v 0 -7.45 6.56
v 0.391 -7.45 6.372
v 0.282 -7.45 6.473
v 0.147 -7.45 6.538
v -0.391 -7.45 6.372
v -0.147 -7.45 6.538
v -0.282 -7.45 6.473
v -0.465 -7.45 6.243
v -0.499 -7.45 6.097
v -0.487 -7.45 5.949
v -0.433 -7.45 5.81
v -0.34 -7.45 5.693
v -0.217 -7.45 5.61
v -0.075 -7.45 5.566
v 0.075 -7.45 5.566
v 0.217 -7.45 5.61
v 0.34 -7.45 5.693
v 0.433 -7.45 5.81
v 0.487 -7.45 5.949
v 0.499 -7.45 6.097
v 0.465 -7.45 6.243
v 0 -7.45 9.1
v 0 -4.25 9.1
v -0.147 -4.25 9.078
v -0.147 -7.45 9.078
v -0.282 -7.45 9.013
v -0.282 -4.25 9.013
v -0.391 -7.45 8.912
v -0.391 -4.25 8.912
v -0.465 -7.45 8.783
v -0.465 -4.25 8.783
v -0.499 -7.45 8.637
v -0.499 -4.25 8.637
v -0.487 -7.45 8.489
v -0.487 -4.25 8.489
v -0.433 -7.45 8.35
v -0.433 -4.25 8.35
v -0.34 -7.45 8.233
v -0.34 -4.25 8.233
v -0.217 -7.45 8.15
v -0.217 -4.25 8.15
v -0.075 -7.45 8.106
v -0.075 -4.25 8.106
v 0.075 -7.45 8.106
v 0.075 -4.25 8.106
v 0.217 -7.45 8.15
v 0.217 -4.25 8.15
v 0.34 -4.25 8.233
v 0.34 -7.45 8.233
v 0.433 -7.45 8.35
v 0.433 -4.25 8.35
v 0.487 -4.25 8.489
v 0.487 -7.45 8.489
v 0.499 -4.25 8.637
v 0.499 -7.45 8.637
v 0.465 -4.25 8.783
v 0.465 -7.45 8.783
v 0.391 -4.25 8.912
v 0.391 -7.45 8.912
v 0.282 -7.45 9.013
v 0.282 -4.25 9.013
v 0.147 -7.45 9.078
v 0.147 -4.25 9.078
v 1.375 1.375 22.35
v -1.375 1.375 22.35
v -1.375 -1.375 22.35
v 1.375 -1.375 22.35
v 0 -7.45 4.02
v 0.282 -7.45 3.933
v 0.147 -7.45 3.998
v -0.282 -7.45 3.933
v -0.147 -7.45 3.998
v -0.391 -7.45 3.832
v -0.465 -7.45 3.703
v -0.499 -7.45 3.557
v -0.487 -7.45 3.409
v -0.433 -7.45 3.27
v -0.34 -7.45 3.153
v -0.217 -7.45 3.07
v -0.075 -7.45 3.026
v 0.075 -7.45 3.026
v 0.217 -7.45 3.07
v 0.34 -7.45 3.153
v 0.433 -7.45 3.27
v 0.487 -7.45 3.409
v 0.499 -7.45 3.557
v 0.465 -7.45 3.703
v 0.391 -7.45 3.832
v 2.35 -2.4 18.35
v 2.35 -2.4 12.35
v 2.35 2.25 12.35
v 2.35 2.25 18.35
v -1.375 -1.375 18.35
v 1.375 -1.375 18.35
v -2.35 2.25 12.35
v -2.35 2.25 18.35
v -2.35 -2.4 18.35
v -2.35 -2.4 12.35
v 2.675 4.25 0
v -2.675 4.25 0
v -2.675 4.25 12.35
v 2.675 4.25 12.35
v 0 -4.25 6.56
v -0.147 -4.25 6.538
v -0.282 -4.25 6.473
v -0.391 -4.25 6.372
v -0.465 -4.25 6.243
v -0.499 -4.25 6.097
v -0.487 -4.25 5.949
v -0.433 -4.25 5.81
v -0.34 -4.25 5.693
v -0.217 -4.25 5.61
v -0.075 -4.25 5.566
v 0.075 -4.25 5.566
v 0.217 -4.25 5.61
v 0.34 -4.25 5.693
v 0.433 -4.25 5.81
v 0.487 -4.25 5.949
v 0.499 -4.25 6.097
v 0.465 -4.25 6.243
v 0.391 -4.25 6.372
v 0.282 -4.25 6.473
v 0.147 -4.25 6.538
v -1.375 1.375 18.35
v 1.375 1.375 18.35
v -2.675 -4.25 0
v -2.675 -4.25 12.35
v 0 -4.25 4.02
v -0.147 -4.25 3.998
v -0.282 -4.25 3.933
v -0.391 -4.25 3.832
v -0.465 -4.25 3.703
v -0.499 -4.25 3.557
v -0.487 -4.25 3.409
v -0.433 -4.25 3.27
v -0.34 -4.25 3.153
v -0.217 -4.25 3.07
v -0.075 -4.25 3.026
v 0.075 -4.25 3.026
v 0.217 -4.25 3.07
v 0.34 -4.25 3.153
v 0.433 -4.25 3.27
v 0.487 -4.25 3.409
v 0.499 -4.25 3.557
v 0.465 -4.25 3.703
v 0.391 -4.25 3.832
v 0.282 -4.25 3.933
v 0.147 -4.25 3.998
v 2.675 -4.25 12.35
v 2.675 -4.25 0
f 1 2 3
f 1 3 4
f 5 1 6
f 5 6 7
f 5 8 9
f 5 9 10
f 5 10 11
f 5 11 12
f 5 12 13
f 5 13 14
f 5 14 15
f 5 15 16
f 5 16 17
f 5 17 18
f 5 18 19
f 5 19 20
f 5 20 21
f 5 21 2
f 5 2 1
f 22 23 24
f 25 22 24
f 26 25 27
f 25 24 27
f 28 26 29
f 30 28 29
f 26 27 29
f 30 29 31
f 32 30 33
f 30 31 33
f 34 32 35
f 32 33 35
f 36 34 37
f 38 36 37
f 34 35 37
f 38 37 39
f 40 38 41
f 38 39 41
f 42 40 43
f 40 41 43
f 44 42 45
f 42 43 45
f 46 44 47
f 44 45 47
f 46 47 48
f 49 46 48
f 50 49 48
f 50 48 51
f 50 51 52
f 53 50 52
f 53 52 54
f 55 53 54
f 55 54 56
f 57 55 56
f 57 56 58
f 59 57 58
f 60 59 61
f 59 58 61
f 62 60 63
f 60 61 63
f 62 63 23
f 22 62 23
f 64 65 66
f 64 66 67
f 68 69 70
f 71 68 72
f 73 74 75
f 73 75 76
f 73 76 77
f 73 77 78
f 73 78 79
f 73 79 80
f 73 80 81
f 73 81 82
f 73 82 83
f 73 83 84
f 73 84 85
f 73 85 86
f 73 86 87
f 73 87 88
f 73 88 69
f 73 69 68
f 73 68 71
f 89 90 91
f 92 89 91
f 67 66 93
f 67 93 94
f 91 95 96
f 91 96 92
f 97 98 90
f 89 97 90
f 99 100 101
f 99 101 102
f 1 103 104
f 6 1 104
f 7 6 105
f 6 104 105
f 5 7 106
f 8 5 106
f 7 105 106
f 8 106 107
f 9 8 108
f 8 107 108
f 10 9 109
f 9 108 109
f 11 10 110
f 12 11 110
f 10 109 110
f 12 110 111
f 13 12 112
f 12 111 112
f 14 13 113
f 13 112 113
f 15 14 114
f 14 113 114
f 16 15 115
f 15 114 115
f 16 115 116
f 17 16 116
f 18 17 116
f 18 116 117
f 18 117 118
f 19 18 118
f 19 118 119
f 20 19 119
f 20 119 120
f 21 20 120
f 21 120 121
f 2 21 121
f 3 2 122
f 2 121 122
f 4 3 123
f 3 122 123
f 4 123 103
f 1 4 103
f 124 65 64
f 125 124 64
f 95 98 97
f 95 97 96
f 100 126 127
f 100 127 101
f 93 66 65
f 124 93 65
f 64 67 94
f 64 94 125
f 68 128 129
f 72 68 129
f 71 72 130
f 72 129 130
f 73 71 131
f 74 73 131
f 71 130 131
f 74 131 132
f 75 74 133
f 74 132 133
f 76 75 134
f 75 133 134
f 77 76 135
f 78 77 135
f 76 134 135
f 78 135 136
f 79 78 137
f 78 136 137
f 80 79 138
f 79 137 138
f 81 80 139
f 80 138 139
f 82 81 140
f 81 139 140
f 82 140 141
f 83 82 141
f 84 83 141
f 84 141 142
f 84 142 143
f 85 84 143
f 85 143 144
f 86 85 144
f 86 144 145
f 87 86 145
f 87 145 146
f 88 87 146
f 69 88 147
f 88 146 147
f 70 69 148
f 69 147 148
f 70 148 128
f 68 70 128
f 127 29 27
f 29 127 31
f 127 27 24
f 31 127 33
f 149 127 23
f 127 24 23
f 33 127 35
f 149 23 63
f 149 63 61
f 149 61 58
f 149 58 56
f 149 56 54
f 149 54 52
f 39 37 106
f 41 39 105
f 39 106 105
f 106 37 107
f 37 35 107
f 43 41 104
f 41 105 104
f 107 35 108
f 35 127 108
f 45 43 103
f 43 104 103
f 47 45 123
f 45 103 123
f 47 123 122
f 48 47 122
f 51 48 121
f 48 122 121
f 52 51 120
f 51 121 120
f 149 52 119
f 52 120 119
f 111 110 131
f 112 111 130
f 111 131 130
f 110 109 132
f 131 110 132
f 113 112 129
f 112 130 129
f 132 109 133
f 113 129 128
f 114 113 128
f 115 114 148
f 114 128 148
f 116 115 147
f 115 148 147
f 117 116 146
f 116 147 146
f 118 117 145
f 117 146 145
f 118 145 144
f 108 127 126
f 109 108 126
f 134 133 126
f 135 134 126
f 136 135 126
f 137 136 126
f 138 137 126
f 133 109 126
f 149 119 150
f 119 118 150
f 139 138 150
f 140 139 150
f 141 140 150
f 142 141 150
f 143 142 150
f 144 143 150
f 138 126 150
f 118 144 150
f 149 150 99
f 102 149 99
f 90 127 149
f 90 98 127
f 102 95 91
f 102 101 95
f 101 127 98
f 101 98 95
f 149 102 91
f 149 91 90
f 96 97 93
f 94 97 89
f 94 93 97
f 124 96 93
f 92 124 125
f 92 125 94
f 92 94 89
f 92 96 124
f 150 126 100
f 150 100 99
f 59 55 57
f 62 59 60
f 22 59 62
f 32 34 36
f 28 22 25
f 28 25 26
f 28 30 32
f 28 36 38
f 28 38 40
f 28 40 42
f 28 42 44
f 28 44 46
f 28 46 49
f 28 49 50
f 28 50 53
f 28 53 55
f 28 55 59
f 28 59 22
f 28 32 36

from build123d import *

# Parameters (mm, degrees)
SKETCH1_W           = 5.35
SKETCH1_H           = 8.5
BOSS_EXTRUDE1_DEPTH = 12.35
SKETCH2_W           = 2.75
SKETCH2_H           = 2.75
BOSS_EXTRUDE2_DEPTH = 10
SKETCH4_W           = 4.7
SKETCH4_H           = 4.65
BOSS_EXTRUDE4_DEPTH = 6
SKETCH3_R           = 0.5
BOSS_EXTRUDE3_DEPTH = 3.2


with BuildPart() as part:
    # Sketch1 → Boss-Extrude1 (new body)
    with BuildSketch(Plane.XY):
        Rectangle(SKETCH1_W, SKETCH1_H)
    extrude(amount=BOSS_EXTRUDE1_DEPTH)

    # Sketch2 → Boss-Extrude2 (add)
    with BuildSketch(Plane.XY.offset(12.35)):
        Rectangle(SKETCH2_W, SKETCH2_H)
    extrude(amount=BOSS_EXTRUDE2_DEPTH)

    # Sketch4 → Boss-Extrude4 (add)
    with BuildSketch(Plane.XY.offset(12.35)):
        with Locations((0, -0.075)):
            Rectangle(SKETCH4_W, SKETCH4_H)
    extrude(amount=BOSS_EXTRUDE4_DEPTH)

    # Sketch3 → Boss-Extrude3 (add)
    with BuildSketch(Plane.XZ.offset(4.25)):
        with Locations(Location((0, 8.6, 0), (0, 0, 90))):
            Circle(SKETCH3_R)
        with Locations(Location((0, 6.06, 0), (0, 0, 90))):
            Circle(SKETCH3_R)
        with Locations(Location((0, 3.52, 0), (0, 0, 90))):
            Circle(SKETCH3_R)
    extrude(amount=BOSS_EXTRUDE3_DEPTH)


solid = part.part
